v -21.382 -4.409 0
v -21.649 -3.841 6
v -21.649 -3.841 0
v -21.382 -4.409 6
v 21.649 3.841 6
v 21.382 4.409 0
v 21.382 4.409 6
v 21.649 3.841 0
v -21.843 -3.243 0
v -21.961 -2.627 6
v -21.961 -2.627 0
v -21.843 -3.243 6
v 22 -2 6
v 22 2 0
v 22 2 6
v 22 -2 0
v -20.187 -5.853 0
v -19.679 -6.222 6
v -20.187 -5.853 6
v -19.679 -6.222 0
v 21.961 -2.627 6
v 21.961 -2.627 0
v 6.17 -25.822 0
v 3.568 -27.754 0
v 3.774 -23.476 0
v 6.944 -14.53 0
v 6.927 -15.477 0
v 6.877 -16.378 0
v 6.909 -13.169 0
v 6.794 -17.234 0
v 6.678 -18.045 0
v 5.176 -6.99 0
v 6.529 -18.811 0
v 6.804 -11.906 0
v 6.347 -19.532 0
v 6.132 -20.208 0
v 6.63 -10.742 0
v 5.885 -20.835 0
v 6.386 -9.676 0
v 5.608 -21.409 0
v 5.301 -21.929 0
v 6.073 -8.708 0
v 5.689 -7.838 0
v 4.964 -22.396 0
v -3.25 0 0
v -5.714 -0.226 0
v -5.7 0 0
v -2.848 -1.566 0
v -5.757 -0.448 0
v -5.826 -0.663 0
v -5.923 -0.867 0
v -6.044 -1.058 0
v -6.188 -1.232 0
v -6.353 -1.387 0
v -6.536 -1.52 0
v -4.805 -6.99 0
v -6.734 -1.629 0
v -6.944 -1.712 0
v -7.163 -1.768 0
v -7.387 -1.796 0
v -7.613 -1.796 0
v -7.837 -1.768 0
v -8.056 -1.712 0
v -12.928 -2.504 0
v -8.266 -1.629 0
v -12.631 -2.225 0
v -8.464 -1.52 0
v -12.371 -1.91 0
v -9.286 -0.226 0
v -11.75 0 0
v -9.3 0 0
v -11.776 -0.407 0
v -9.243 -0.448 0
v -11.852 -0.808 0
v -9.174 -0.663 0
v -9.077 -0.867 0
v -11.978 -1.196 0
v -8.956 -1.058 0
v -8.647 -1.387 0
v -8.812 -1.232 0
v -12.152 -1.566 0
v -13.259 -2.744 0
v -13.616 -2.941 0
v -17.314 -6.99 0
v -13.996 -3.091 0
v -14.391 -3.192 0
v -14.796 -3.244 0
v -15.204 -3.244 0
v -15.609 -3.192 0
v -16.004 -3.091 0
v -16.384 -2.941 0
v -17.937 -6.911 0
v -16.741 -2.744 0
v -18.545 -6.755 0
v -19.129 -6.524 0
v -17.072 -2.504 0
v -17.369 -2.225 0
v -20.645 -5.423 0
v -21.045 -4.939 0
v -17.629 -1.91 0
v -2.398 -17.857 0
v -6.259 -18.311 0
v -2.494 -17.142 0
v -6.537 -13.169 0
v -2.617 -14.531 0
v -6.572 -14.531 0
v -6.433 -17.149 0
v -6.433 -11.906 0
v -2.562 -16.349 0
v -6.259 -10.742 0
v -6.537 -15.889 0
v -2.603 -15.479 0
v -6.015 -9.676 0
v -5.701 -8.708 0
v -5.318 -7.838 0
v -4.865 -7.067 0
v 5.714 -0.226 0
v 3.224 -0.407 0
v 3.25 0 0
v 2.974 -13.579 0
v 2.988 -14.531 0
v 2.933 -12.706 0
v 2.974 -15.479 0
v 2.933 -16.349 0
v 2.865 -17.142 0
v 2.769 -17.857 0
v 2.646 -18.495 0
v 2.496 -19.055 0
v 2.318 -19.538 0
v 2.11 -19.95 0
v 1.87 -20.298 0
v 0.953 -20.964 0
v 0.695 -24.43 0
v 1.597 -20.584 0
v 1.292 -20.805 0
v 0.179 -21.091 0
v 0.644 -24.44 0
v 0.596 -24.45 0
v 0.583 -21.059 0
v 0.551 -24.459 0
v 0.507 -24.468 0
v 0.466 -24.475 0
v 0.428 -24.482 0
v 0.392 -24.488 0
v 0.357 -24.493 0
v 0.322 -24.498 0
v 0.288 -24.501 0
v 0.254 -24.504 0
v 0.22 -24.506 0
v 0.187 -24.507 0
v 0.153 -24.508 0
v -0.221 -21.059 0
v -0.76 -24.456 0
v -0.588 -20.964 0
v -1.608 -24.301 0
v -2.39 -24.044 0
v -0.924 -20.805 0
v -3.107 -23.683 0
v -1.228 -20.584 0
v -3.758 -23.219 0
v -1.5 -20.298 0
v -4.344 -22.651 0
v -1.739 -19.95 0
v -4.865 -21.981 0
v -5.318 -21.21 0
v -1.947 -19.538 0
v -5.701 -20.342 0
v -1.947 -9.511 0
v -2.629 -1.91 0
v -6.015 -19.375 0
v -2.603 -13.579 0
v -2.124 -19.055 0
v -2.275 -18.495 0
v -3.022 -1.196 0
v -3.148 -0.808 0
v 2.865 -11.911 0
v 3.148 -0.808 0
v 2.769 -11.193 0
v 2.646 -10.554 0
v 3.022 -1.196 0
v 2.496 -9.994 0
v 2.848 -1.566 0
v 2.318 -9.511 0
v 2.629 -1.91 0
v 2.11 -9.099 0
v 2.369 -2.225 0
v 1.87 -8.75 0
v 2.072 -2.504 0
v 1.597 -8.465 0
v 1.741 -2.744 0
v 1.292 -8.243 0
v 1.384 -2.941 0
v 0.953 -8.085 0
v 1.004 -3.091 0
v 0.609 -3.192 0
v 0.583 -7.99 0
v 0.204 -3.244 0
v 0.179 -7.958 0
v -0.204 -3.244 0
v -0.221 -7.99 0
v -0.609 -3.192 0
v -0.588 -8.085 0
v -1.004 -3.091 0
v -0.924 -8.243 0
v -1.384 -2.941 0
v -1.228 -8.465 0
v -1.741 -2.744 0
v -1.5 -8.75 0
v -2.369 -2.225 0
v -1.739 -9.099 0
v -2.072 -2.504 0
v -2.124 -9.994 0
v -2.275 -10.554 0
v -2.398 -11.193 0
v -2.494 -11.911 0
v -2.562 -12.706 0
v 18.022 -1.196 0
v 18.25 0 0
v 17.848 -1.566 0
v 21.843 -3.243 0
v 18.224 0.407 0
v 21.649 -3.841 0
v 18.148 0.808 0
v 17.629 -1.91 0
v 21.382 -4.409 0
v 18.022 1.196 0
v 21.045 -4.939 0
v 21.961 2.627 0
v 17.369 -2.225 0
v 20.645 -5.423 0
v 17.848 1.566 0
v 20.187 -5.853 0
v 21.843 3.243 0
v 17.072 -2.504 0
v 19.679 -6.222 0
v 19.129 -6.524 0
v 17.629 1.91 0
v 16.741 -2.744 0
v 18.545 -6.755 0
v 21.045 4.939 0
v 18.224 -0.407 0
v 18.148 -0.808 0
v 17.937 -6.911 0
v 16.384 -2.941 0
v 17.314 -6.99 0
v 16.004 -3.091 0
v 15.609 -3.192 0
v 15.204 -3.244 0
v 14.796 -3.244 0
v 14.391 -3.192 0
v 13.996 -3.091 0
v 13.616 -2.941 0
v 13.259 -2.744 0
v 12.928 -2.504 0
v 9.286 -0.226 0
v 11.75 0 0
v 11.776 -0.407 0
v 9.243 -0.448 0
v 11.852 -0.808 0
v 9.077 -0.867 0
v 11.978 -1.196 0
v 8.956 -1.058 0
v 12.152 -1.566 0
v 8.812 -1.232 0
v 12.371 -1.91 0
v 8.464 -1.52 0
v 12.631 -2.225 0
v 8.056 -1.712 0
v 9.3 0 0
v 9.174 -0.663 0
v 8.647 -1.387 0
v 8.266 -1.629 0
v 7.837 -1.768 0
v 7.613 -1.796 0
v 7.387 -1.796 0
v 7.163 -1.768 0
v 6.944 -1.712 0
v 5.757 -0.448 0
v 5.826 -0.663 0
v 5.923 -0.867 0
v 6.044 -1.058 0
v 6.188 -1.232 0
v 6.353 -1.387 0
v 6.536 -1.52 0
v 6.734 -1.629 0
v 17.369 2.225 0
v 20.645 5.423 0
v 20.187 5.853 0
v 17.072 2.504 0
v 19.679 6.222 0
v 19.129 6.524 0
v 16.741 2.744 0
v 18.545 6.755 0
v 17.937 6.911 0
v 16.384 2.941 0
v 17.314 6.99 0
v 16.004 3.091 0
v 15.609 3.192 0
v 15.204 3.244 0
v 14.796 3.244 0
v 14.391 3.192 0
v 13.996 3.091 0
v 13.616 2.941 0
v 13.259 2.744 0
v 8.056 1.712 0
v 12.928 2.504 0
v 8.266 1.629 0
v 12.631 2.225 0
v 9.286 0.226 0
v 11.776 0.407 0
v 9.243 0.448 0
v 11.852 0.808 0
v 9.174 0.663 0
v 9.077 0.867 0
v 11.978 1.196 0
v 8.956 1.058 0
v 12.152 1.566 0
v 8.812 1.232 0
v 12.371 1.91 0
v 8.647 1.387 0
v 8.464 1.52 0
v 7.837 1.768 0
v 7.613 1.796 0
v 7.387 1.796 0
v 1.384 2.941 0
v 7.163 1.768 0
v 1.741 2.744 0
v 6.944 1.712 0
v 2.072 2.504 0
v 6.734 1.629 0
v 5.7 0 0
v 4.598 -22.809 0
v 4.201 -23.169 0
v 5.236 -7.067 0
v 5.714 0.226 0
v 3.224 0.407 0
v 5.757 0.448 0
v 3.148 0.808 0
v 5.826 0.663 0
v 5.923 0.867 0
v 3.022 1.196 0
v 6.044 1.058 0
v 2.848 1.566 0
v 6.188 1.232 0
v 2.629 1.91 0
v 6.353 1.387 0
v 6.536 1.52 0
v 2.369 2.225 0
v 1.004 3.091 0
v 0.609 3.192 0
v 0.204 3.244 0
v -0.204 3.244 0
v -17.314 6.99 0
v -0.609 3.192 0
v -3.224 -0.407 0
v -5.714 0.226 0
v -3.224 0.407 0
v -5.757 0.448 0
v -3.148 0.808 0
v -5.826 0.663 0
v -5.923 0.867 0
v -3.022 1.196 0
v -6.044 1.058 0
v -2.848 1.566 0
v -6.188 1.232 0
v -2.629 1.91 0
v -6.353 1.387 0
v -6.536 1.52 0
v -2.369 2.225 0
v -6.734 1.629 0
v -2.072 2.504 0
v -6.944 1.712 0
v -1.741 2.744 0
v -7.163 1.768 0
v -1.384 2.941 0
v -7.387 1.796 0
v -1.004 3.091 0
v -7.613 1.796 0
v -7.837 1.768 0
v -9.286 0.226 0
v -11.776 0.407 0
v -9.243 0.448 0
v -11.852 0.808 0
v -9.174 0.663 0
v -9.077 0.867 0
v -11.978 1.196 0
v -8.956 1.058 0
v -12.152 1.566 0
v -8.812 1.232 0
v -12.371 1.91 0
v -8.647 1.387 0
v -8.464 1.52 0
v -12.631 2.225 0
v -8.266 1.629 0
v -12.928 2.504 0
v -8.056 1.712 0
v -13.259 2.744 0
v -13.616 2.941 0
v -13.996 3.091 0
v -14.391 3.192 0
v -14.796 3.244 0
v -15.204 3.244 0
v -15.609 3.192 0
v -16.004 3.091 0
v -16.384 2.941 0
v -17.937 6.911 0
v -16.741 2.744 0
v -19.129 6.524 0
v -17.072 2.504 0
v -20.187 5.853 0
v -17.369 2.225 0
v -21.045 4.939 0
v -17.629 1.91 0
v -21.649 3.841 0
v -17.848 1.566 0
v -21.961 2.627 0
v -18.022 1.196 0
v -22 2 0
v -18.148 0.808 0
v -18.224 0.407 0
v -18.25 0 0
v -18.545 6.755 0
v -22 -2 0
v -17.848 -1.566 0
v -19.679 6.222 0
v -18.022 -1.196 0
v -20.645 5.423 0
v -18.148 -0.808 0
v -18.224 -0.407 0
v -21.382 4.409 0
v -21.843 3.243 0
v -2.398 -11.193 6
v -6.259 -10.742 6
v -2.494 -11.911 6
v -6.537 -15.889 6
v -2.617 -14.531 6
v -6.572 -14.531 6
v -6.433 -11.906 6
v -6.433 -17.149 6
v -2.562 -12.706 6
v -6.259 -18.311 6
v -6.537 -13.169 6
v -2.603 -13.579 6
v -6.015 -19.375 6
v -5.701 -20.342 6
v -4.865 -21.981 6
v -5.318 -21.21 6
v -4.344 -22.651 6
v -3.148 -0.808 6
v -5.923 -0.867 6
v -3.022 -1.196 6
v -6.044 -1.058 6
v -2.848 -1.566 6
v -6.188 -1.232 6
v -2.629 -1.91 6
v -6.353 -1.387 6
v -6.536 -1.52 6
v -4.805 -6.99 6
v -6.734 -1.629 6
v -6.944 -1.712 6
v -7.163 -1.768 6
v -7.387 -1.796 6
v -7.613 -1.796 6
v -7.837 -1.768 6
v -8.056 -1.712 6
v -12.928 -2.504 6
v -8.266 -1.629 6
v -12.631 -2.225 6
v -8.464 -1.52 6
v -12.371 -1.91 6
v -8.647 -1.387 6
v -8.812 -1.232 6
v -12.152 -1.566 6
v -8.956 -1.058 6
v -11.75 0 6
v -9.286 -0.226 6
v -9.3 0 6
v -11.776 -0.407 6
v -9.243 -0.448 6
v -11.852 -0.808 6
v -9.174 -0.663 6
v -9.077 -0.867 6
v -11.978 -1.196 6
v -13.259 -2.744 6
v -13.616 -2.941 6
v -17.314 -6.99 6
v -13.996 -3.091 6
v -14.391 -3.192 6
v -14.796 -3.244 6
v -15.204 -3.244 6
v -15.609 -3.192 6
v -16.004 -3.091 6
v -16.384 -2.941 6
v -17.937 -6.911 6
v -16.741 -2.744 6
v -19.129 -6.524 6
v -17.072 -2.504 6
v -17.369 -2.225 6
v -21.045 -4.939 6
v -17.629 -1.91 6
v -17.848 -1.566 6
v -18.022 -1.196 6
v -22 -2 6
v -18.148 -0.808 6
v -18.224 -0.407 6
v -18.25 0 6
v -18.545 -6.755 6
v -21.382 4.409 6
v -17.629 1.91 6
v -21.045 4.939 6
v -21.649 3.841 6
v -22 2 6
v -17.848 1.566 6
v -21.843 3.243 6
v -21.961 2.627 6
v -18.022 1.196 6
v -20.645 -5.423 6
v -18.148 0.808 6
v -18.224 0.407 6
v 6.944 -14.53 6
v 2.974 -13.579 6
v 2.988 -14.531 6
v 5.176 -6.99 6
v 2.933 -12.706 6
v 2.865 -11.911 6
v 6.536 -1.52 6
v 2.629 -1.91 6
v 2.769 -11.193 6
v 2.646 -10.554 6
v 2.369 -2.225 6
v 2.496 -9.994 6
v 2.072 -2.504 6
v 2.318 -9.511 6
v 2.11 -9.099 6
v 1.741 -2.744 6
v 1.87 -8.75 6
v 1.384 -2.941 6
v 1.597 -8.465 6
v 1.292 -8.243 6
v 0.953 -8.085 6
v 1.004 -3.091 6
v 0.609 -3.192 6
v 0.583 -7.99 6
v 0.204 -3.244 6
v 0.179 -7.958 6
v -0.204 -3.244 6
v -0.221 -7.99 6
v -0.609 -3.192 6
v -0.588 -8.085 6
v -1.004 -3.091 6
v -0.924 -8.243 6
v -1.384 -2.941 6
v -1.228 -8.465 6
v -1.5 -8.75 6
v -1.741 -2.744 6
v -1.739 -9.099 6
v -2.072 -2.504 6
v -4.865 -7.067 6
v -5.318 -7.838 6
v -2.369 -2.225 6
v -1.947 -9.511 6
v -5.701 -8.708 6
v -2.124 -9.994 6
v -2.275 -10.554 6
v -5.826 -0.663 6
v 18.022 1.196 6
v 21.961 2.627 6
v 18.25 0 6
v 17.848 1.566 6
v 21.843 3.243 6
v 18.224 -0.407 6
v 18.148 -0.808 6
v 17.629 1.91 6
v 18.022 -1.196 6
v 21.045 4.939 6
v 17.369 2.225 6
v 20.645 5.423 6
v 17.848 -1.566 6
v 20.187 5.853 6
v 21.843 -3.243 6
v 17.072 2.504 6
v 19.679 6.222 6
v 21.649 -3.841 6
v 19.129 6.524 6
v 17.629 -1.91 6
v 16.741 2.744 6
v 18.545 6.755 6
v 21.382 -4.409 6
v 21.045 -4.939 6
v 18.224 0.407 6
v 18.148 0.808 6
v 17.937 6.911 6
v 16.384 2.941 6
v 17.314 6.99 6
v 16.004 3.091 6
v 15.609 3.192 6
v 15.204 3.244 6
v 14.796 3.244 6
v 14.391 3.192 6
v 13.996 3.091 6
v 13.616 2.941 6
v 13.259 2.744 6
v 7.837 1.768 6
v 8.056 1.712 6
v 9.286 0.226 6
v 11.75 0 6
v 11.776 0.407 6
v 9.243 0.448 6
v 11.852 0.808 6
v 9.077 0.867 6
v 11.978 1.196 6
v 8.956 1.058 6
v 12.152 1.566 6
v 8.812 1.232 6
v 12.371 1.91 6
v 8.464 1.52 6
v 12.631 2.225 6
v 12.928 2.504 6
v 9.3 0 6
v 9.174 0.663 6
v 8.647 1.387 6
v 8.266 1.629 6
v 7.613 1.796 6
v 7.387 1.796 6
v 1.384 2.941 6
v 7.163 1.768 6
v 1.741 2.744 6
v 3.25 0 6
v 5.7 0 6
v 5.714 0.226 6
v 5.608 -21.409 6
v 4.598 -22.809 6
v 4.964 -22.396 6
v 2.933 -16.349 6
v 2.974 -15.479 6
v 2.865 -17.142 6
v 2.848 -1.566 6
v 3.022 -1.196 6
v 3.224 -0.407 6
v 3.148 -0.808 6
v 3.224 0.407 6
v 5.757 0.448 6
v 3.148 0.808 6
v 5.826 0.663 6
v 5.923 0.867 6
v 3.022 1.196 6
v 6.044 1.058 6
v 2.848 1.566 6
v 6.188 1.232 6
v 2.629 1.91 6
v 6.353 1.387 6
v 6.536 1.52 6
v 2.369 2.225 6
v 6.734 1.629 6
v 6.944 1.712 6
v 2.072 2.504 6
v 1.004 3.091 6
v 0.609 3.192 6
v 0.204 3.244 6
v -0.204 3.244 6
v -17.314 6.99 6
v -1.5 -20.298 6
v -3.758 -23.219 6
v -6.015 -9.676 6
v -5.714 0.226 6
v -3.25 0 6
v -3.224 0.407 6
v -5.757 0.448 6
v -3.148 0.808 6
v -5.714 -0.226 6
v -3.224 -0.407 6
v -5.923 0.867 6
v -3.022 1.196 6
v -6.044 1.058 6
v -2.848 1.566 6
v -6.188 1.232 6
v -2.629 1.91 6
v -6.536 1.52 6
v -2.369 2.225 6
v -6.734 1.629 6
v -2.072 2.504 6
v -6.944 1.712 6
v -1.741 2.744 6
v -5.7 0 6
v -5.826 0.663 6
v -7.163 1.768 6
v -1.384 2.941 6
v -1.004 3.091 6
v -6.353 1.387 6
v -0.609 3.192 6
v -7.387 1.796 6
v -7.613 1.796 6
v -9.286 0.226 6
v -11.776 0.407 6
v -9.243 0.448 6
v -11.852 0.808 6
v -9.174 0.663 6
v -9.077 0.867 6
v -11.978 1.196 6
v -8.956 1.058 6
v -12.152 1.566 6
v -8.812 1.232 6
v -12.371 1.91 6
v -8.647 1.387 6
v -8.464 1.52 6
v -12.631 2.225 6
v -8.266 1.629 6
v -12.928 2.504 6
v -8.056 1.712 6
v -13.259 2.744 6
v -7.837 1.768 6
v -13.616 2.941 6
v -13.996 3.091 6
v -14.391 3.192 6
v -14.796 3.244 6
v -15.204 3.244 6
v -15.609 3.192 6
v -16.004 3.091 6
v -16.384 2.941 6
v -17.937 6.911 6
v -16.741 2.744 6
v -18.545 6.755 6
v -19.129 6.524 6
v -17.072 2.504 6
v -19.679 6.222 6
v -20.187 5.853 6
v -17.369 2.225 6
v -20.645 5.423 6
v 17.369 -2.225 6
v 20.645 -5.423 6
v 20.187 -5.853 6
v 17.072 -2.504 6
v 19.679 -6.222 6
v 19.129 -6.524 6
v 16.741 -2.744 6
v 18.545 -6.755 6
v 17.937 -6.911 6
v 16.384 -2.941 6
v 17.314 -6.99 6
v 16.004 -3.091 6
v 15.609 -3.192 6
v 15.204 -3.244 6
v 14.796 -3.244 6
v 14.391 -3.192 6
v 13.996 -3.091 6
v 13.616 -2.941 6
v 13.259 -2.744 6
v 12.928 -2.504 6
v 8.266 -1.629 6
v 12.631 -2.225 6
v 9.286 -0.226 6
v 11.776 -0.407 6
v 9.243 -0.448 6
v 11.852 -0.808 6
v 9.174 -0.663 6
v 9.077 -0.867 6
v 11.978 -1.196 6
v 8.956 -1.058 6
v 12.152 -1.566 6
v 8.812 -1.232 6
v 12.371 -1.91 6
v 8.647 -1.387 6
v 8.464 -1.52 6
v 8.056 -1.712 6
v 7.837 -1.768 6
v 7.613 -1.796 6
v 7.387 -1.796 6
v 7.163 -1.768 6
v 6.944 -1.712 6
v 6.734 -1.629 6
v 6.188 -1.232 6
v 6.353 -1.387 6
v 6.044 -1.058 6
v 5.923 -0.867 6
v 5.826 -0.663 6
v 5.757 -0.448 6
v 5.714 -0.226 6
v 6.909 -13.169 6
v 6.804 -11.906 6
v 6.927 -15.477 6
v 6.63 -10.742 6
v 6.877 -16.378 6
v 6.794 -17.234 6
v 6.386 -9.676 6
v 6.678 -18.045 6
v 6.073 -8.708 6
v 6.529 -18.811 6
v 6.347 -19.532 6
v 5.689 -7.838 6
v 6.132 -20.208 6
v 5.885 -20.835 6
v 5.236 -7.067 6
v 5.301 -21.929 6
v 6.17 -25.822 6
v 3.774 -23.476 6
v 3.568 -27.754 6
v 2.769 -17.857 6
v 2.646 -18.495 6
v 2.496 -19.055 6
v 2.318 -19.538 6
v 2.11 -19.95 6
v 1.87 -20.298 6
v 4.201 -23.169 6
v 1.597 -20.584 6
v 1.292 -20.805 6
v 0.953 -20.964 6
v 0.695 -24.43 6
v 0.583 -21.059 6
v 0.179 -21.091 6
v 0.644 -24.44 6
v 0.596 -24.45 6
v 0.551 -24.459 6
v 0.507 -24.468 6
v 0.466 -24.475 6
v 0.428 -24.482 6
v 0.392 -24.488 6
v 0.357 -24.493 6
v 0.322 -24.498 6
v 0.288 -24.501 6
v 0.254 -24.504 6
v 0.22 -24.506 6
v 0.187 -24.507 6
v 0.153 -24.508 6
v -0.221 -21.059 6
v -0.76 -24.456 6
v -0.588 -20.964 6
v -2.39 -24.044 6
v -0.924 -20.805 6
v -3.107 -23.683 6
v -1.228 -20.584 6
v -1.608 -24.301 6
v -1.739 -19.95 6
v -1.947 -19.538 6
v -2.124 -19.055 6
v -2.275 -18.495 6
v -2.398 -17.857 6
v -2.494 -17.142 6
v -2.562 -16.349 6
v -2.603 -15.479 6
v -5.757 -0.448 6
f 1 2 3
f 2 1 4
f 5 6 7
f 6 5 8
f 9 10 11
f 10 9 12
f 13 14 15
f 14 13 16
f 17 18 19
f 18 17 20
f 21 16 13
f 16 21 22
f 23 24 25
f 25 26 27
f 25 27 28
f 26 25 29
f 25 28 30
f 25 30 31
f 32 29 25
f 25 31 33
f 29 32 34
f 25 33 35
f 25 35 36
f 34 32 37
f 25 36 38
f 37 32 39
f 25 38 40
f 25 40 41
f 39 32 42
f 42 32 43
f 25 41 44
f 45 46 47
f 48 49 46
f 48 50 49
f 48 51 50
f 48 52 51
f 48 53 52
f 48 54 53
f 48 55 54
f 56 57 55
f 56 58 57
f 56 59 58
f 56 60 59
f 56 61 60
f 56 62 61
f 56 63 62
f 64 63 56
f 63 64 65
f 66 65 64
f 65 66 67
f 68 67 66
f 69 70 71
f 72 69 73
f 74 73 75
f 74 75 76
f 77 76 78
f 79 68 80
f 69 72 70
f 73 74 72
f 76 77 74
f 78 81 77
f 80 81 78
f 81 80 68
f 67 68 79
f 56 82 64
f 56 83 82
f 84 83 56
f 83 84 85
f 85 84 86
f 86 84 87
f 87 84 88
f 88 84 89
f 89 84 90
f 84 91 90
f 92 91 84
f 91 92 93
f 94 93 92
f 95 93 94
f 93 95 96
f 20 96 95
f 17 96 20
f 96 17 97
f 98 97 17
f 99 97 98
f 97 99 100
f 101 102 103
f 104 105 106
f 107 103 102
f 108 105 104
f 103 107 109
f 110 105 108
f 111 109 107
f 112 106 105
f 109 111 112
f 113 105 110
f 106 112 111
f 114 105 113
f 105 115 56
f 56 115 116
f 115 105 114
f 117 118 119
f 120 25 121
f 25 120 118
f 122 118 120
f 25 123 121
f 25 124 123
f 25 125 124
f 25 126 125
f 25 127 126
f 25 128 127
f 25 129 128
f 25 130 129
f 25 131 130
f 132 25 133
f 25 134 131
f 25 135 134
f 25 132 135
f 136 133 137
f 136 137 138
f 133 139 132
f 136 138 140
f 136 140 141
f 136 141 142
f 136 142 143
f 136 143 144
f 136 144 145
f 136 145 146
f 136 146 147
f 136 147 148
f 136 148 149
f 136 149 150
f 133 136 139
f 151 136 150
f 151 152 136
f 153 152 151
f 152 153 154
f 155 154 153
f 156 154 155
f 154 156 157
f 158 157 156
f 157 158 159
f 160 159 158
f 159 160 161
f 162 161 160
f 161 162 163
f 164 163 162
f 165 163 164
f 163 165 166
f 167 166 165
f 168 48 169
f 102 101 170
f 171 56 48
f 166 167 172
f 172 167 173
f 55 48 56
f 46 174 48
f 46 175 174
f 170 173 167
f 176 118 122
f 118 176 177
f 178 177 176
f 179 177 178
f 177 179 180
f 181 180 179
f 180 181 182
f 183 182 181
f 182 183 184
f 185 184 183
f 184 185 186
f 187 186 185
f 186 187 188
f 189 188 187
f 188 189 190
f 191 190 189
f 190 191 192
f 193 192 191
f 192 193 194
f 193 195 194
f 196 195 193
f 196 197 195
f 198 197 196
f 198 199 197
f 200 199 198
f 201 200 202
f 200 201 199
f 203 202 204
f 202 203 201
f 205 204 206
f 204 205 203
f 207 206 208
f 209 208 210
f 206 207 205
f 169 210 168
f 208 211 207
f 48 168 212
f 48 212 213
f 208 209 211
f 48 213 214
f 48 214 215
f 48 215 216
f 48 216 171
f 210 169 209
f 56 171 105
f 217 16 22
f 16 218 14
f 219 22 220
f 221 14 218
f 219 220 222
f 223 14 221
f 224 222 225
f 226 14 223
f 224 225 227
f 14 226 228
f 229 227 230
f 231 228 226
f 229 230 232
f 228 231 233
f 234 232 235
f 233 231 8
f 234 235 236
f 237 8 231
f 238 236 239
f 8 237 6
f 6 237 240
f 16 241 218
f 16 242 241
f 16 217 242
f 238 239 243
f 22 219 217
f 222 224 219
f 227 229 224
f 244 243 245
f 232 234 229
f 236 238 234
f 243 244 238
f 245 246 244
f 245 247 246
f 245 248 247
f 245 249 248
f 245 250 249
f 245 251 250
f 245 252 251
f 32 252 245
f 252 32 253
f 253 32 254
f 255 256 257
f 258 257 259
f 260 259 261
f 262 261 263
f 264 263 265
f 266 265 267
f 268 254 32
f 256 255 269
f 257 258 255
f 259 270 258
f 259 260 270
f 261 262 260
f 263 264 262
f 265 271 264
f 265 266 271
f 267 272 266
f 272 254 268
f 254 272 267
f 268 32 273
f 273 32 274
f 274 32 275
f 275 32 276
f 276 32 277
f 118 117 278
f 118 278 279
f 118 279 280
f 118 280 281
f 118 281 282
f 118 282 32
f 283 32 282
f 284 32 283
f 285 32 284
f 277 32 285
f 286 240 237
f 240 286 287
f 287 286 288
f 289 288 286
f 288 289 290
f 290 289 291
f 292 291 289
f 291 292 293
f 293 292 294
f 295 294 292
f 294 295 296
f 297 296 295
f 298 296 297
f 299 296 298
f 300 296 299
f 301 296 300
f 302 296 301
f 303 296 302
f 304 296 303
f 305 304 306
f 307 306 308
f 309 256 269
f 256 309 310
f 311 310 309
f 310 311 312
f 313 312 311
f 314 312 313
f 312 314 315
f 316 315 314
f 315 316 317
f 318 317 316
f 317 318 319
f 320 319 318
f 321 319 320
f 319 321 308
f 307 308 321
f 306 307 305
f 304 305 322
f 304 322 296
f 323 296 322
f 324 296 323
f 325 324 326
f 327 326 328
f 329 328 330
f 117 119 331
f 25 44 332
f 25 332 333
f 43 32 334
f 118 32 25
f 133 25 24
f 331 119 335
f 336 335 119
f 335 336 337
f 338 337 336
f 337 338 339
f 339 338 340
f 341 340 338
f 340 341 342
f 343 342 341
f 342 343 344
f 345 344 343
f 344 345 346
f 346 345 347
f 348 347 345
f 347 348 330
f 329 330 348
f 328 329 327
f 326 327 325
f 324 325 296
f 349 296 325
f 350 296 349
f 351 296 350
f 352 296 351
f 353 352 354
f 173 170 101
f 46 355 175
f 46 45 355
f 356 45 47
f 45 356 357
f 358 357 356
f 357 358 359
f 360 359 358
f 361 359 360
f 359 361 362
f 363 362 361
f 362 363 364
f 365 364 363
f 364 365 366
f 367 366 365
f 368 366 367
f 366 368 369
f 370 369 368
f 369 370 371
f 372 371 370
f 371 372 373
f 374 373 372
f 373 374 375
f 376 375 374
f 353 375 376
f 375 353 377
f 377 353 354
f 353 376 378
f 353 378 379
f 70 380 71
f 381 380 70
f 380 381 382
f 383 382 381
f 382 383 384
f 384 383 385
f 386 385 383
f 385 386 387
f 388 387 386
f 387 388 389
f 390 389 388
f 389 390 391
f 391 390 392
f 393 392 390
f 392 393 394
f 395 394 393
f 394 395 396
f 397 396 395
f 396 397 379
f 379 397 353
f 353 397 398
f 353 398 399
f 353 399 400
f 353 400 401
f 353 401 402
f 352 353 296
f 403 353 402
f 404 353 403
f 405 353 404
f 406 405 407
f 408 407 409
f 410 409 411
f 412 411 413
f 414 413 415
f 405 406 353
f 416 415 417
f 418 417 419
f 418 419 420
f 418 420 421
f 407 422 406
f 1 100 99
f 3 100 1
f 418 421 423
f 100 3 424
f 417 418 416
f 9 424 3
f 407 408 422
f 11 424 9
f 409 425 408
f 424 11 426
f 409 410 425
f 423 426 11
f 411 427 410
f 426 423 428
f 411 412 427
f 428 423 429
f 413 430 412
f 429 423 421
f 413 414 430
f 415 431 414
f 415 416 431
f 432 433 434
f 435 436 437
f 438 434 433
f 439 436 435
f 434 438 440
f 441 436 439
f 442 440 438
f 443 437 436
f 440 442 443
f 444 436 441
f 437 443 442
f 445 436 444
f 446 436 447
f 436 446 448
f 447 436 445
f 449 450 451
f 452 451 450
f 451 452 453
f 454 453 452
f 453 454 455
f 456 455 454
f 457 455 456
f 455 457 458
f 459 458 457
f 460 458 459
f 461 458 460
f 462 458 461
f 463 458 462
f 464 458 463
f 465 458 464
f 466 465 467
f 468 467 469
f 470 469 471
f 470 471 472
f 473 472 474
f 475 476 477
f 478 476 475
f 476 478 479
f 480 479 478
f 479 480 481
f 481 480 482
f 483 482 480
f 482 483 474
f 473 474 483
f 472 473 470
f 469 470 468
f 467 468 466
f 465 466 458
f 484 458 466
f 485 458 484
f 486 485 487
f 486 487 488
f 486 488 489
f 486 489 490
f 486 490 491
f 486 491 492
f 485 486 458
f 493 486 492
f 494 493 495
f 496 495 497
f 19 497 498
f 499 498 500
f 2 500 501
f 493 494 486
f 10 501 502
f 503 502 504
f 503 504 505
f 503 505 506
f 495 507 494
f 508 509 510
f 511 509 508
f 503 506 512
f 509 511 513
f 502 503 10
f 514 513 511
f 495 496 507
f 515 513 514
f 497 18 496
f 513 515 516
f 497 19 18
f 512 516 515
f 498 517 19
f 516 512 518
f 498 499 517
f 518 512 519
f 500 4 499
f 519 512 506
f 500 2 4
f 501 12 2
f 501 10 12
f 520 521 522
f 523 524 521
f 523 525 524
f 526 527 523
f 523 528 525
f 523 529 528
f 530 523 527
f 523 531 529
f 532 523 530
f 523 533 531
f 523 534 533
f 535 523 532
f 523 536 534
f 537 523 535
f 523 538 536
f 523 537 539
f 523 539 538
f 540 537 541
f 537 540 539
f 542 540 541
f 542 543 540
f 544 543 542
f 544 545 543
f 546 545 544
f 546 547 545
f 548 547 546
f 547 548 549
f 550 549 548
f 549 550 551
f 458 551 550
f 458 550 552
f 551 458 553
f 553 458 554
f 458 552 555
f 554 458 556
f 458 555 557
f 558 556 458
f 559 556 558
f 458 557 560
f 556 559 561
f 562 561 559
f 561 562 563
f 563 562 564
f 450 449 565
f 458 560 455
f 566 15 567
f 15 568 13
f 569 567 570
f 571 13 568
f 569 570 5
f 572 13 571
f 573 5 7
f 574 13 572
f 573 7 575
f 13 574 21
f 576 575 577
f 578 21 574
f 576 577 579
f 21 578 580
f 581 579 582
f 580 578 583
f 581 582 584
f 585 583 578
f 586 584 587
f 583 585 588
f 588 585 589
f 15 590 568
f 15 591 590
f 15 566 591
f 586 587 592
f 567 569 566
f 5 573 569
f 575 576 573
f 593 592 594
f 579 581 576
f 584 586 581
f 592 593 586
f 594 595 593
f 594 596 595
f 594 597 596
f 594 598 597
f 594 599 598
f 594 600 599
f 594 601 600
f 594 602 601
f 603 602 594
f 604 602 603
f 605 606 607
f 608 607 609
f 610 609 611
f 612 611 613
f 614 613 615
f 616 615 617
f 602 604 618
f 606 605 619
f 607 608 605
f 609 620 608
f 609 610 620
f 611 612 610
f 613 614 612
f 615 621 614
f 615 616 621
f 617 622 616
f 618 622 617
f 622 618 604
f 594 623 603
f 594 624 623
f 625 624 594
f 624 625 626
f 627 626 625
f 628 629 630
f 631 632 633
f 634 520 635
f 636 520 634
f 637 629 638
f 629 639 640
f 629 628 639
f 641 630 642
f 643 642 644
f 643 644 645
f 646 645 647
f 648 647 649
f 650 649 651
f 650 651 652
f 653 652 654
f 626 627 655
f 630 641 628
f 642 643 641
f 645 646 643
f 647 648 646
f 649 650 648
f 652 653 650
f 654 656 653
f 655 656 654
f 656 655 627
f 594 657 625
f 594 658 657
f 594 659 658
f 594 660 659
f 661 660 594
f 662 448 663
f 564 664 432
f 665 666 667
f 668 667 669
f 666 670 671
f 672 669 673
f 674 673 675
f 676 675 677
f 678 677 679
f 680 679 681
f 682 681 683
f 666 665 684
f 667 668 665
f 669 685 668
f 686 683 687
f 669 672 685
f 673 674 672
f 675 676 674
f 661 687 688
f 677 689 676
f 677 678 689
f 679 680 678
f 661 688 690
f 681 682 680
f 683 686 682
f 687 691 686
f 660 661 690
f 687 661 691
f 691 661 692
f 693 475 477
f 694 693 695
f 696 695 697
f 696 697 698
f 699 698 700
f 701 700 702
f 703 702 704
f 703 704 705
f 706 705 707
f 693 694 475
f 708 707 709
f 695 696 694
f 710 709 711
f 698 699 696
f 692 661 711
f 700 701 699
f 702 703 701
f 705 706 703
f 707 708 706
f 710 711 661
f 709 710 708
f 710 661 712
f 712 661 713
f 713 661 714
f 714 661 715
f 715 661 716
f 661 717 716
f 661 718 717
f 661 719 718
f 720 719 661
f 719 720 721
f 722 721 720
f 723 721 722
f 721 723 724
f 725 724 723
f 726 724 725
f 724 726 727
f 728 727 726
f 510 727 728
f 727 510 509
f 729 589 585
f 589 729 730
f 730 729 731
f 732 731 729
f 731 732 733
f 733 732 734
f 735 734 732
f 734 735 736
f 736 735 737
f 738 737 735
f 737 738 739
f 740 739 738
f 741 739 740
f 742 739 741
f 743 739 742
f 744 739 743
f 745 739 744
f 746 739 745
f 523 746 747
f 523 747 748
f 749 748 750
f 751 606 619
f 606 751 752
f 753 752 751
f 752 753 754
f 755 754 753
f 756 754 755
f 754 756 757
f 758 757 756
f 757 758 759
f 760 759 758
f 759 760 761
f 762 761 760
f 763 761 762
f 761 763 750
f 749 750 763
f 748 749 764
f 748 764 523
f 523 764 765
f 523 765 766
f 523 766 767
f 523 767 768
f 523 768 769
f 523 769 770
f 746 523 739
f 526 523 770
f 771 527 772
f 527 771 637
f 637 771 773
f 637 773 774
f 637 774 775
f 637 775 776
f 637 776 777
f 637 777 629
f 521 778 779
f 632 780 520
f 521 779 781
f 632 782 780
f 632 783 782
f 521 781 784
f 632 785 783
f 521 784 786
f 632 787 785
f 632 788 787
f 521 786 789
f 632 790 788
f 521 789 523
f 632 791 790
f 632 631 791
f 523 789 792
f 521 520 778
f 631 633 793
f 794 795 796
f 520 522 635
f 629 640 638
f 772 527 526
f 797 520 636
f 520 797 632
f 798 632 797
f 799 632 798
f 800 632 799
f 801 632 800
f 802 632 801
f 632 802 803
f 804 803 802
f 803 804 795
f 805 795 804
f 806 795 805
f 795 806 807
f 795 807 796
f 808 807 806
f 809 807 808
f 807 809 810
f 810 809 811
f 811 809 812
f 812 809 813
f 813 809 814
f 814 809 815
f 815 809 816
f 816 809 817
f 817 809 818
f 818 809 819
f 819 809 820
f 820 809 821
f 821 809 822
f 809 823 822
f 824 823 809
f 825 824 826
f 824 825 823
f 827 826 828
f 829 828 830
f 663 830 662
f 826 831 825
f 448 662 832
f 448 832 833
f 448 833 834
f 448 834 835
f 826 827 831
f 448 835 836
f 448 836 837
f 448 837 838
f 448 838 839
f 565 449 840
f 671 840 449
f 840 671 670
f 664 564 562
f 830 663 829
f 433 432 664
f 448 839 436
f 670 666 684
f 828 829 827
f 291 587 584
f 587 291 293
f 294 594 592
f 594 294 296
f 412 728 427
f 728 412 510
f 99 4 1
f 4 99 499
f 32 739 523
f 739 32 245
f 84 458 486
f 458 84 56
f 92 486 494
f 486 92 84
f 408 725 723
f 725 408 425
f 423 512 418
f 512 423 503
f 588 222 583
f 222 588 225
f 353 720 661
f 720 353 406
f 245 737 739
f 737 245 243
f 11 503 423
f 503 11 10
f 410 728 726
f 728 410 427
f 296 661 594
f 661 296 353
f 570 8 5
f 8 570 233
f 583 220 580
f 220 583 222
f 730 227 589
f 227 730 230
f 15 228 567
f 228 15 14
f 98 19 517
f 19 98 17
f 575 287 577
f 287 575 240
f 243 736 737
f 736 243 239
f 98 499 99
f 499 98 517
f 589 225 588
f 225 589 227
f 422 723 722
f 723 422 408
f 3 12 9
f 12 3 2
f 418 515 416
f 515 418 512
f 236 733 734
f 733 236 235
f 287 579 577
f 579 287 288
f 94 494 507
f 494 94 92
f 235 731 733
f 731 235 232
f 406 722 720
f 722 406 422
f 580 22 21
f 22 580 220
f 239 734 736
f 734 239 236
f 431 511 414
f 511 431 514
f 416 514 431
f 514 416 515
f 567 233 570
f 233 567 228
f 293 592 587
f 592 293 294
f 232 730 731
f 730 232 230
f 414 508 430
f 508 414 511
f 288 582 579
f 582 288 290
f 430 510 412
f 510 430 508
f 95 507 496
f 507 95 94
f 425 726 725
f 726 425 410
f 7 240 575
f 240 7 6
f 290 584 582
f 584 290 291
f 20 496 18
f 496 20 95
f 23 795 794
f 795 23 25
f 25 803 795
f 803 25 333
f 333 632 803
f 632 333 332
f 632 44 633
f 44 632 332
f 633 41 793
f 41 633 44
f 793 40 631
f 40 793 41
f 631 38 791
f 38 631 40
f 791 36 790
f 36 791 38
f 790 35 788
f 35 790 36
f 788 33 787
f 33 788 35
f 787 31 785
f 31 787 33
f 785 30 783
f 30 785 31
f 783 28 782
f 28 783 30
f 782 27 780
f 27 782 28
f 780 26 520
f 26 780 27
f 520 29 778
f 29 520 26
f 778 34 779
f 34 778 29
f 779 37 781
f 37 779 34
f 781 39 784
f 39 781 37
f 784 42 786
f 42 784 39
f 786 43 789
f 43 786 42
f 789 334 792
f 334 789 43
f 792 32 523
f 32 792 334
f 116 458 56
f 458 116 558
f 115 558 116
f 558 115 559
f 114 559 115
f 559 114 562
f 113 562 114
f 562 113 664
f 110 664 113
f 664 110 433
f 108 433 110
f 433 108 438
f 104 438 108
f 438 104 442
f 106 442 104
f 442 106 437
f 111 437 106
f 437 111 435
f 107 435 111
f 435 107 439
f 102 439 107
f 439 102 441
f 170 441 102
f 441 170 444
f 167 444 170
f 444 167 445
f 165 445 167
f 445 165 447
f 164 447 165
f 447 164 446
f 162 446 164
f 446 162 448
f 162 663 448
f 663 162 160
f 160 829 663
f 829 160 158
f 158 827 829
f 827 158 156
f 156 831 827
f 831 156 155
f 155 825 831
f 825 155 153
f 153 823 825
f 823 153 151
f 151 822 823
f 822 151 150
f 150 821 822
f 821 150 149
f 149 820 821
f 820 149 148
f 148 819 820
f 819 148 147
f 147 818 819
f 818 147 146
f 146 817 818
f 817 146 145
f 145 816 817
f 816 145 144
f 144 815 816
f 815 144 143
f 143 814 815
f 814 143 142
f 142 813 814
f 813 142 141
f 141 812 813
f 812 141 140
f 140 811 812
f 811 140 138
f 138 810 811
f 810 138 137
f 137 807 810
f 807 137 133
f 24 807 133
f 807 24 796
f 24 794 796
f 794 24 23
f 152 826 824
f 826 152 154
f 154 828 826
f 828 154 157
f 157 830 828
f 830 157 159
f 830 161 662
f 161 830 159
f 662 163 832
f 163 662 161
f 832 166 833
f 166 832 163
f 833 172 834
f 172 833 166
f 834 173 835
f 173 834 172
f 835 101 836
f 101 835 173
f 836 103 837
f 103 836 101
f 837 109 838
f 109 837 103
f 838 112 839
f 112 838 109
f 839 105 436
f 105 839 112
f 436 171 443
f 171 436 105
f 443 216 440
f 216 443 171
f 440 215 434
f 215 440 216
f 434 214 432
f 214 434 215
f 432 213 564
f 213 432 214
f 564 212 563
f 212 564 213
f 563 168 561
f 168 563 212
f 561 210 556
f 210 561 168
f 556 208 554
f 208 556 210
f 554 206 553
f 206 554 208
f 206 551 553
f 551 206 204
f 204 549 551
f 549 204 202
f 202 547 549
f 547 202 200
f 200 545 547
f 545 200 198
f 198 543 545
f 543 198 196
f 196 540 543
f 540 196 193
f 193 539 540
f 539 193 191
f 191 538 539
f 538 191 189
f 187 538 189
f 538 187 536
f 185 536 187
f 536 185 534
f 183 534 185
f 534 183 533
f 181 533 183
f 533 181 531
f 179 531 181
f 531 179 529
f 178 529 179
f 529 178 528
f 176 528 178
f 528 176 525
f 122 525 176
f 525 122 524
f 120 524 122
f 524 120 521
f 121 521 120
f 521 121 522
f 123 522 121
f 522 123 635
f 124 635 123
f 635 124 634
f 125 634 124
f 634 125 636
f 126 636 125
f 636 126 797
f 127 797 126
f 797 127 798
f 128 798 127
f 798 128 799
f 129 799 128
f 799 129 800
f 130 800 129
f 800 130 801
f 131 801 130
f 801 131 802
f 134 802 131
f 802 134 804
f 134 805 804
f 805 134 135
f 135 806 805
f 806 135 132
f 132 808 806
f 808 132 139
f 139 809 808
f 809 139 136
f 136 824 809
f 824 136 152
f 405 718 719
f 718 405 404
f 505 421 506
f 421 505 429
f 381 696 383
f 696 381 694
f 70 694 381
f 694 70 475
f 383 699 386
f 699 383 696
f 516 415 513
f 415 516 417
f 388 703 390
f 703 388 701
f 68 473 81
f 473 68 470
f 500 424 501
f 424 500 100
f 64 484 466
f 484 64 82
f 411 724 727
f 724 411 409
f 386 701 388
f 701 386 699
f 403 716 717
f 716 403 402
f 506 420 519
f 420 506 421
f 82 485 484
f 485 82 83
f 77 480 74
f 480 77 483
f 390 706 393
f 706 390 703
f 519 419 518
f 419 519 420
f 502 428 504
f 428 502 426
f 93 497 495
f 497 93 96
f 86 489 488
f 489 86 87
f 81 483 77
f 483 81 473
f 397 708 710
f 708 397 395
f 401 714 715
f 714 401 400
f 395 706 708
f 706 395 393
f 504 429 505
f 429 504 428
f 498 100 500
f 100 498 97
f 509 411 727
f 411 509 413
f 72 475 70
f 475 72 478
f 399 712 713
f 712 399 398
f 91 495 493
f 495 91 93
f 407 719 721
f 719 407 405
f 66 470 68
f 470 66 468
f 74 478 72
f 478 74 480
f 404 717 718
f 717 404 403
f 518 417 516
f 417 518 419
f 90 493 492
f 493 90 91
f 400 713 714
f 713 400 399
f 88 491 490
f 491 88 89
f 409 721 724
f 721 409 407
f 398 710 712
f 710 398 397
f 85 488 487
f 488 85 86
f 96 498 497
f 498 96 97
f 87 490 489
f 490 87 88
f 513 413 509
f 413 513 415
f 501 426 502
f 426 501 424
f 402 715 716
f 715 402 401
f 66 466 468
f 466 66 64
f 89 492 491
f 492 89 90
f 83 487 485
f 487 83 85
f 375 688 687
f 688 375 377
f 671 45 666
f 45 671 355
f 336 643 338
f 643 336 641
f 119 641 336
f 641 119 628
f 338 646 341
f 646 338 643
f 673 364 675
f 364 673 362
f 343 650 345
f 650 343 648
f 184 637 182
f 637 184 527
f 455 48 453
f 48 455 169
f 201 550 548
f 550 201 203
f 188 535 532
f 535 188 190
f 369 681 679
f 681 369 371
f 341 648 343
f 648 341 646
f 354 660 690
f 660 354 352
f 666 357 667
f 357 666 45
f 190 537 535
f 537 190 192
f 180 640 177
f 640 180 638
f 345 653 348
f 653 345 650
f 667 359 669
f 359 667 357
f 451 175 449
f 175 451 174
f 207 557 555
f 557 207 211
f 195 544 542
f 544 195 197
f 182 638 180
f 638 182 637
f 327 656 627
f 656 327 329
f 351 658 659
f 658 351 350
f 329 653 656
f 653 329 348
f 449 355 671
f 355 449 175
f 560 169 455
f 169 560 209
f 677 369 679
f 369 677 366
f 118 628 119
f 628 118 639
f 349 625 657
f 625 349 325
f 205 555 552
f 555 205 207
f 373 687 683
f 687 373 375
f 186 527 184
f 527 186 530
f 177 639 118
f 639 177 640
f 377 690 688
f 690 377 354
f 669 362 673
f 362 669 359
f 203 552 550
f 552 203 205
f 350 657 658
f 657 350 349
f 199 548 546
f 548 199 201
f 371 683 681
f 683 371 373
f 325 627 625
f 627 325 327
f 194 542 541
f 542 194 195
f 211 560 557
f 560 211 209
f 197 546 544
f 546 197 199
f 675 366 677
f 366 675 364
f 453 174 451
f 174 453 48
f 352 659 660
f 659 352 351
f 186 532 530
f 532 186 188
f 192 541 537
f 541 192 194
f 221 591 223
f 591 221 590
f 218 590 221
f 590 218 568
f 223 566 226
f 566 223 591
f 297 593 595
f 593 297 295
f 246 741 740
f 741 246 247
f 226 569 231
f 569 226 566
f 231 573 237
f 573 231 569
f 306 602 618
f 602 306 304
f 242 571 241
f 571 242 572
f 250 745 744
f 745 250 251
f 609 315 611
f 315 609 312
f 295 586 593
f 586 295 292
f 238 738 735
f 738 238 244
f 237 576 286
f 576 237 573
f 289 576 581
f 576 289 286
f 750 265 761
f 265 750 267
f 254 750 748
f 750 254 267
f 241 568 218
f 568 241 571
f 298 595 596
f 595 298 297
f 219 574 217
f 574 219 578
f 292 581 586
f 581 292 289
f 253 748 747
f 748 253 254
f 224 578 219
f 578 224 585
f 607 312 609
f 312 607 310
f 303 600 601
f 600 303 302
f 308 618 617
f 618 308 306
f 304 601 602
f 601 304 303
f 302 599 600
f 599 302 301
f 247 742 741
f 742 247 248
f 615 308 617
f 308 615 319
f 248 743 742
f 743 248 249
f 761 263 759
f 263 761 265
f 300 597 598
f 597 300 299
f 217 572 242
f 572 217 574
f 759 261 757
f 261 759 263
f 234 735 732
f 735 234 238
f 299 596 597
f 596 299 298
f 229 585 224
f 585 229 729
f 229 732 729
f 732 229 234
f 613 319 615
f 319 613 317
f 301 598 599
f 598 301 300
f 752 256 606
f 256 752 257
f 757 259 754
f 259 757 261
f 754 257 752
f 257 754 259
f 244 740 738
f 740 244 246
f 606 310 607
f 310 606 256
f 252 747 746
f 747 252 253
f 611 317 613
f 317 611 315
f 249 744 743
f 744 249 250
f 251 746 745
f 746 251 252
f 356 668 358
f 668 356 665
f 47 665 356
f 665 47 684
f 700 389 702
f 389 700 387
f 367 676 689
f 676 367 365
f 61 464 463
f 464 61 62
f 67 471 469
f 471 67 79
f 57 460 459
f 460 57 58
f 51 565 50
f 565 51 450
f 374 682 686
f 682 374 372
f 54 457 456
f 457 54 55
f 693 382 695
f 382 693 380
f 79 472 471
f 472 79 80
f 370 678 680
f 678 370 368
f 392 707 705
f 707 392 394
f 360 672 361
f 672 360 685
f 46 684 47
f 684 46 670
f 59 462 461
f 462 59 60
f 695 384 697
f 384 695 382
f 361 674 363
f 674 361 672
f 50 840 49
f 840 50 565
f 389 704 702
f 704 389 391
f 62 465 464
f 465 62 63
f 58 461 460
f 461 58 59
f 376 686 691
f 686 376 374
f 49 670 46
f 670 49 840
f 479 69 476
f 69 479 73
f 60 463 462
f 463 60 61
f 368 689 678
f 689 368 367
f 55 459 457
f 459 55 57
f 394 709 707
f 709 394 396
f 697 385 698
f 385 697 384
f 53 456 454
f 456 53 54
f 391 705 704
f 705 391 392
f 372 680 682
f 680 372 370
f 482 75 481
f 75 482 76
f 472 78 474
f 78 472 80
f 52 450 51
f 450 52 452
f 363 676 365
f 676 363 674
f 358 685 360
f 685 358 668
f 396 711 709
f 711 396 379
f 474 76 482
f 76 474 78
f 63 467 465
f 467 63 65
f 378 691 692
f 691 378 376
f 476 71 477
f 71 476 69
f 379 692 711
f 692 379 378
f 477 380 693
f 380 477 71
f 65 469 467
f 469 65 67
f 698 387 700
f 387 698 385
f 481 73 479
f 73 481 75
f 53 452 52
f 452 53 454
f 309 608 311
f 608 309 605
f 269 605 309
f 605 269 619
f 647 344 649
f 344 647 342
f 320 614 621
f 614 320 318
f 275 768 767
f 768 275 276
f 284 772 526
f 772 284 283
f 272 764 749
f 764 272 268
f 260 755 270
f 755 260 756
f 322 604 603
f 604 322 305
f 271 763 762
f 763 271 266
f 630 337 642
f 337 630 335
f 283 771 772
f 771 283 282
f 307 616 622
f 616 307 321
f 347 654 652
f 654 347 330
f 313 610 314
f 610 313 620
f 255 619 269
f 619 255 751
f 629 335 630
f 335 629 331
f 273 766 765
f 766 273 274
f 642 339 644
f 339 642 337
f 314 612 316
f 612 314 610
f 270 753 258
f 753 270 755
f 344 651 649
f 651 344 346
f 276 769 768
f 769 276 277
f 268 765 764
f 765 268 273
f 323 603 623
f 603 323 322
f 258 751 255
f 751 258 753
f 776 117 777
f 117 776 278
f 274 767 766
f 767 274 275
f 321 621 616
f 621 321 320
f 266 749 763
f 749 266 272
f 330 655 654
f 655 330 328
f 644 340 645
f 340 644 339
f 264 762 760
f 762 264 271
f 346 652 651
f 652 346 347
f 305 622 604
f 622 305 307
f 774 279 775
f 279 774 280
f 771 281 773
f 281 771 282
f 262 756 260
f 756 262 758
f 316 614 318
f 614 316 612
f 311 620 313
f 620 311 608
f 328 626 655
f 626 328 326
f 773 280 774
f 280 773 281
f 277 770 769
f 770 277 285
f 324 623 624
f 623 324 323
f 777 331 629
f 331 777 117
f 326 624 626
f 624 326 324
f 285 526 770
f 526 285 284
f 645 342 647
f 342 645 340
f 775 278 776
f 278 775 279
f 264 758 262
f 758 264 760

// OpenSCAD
$fn = 50;


difference() {
	union() {
		hull() {
			translate(v = [-17.0000000000, 2.0000000000, 0]) {
				cylinder(h = 6, r = 5);
			}
			translate(v = [17.0000000000, 2.0000000000, 0]) {
				cylinder(h = 6, r = 5);
			}
			translate(v = [-17.0000000000, -2.0000000000, 0]) {
				cylinder(h = 6, r = 5);
			}
			translate(v = [17.0000000000, -2.0000000000, 0]) {
				cylinder(h = 6, r = 5);
			}
		}
		translate(v = [0, -5, 0]) {
			linear_extrude(height = 6) {
				text(font = "DejaVu Sans Mono:style=Bold", halign = "center", size = 19.0000000000, text = "Q", valign = "top");
			}
		}
	}
	union() {
		translate(v = [-15.0000000000, 0.0000000000, 0]) {
			translate(v = [0, 0, -100]) {
				cylinder(h = 200, r = 3.2500000000);
			}
		}
		translate(v = [0, 0, -100]) {
			cylinder(h = 200, r = 3.2500000000);
		}
		translate(v = [15.0000000000, 0.0000000000, 0]) {
			translate(v = [0, 0, -100]) {
				cylinder(h = 200, r = 3.2500000000);
			}
		}
		translate(v = [-15.0000000000, 0.0000000000, 0]) {
			translate(v = [0, 0, -100]) {
				cylinder(h = 200, r = 1.8000000000);
			}
		}
		translate(v = [-7.5000000000, 0.0000000000, 0]) {
			translate(v = [0, 0, -100]) {
				cylinder(h = 200, r = 1.8000000000);
			}
		}
		translate(v = [0, 0, -100]) {
			cylinder(h = 200, r = 1.8000000000);
		}
		translate(v = [7.5000000000, 0.0000000000, 0]) {
			translate(v = [0, 0, -100]) {
				cylinder(h = 200, r = 1.8000000000);
			}
		}
		translate(v = [15.0000000000, 0.0000000000, 0]) {
			translate(v = [0, 0, -100]) {
				cylinder(h = 200, r = 1.8000000000);
			}
		}
	}
}
